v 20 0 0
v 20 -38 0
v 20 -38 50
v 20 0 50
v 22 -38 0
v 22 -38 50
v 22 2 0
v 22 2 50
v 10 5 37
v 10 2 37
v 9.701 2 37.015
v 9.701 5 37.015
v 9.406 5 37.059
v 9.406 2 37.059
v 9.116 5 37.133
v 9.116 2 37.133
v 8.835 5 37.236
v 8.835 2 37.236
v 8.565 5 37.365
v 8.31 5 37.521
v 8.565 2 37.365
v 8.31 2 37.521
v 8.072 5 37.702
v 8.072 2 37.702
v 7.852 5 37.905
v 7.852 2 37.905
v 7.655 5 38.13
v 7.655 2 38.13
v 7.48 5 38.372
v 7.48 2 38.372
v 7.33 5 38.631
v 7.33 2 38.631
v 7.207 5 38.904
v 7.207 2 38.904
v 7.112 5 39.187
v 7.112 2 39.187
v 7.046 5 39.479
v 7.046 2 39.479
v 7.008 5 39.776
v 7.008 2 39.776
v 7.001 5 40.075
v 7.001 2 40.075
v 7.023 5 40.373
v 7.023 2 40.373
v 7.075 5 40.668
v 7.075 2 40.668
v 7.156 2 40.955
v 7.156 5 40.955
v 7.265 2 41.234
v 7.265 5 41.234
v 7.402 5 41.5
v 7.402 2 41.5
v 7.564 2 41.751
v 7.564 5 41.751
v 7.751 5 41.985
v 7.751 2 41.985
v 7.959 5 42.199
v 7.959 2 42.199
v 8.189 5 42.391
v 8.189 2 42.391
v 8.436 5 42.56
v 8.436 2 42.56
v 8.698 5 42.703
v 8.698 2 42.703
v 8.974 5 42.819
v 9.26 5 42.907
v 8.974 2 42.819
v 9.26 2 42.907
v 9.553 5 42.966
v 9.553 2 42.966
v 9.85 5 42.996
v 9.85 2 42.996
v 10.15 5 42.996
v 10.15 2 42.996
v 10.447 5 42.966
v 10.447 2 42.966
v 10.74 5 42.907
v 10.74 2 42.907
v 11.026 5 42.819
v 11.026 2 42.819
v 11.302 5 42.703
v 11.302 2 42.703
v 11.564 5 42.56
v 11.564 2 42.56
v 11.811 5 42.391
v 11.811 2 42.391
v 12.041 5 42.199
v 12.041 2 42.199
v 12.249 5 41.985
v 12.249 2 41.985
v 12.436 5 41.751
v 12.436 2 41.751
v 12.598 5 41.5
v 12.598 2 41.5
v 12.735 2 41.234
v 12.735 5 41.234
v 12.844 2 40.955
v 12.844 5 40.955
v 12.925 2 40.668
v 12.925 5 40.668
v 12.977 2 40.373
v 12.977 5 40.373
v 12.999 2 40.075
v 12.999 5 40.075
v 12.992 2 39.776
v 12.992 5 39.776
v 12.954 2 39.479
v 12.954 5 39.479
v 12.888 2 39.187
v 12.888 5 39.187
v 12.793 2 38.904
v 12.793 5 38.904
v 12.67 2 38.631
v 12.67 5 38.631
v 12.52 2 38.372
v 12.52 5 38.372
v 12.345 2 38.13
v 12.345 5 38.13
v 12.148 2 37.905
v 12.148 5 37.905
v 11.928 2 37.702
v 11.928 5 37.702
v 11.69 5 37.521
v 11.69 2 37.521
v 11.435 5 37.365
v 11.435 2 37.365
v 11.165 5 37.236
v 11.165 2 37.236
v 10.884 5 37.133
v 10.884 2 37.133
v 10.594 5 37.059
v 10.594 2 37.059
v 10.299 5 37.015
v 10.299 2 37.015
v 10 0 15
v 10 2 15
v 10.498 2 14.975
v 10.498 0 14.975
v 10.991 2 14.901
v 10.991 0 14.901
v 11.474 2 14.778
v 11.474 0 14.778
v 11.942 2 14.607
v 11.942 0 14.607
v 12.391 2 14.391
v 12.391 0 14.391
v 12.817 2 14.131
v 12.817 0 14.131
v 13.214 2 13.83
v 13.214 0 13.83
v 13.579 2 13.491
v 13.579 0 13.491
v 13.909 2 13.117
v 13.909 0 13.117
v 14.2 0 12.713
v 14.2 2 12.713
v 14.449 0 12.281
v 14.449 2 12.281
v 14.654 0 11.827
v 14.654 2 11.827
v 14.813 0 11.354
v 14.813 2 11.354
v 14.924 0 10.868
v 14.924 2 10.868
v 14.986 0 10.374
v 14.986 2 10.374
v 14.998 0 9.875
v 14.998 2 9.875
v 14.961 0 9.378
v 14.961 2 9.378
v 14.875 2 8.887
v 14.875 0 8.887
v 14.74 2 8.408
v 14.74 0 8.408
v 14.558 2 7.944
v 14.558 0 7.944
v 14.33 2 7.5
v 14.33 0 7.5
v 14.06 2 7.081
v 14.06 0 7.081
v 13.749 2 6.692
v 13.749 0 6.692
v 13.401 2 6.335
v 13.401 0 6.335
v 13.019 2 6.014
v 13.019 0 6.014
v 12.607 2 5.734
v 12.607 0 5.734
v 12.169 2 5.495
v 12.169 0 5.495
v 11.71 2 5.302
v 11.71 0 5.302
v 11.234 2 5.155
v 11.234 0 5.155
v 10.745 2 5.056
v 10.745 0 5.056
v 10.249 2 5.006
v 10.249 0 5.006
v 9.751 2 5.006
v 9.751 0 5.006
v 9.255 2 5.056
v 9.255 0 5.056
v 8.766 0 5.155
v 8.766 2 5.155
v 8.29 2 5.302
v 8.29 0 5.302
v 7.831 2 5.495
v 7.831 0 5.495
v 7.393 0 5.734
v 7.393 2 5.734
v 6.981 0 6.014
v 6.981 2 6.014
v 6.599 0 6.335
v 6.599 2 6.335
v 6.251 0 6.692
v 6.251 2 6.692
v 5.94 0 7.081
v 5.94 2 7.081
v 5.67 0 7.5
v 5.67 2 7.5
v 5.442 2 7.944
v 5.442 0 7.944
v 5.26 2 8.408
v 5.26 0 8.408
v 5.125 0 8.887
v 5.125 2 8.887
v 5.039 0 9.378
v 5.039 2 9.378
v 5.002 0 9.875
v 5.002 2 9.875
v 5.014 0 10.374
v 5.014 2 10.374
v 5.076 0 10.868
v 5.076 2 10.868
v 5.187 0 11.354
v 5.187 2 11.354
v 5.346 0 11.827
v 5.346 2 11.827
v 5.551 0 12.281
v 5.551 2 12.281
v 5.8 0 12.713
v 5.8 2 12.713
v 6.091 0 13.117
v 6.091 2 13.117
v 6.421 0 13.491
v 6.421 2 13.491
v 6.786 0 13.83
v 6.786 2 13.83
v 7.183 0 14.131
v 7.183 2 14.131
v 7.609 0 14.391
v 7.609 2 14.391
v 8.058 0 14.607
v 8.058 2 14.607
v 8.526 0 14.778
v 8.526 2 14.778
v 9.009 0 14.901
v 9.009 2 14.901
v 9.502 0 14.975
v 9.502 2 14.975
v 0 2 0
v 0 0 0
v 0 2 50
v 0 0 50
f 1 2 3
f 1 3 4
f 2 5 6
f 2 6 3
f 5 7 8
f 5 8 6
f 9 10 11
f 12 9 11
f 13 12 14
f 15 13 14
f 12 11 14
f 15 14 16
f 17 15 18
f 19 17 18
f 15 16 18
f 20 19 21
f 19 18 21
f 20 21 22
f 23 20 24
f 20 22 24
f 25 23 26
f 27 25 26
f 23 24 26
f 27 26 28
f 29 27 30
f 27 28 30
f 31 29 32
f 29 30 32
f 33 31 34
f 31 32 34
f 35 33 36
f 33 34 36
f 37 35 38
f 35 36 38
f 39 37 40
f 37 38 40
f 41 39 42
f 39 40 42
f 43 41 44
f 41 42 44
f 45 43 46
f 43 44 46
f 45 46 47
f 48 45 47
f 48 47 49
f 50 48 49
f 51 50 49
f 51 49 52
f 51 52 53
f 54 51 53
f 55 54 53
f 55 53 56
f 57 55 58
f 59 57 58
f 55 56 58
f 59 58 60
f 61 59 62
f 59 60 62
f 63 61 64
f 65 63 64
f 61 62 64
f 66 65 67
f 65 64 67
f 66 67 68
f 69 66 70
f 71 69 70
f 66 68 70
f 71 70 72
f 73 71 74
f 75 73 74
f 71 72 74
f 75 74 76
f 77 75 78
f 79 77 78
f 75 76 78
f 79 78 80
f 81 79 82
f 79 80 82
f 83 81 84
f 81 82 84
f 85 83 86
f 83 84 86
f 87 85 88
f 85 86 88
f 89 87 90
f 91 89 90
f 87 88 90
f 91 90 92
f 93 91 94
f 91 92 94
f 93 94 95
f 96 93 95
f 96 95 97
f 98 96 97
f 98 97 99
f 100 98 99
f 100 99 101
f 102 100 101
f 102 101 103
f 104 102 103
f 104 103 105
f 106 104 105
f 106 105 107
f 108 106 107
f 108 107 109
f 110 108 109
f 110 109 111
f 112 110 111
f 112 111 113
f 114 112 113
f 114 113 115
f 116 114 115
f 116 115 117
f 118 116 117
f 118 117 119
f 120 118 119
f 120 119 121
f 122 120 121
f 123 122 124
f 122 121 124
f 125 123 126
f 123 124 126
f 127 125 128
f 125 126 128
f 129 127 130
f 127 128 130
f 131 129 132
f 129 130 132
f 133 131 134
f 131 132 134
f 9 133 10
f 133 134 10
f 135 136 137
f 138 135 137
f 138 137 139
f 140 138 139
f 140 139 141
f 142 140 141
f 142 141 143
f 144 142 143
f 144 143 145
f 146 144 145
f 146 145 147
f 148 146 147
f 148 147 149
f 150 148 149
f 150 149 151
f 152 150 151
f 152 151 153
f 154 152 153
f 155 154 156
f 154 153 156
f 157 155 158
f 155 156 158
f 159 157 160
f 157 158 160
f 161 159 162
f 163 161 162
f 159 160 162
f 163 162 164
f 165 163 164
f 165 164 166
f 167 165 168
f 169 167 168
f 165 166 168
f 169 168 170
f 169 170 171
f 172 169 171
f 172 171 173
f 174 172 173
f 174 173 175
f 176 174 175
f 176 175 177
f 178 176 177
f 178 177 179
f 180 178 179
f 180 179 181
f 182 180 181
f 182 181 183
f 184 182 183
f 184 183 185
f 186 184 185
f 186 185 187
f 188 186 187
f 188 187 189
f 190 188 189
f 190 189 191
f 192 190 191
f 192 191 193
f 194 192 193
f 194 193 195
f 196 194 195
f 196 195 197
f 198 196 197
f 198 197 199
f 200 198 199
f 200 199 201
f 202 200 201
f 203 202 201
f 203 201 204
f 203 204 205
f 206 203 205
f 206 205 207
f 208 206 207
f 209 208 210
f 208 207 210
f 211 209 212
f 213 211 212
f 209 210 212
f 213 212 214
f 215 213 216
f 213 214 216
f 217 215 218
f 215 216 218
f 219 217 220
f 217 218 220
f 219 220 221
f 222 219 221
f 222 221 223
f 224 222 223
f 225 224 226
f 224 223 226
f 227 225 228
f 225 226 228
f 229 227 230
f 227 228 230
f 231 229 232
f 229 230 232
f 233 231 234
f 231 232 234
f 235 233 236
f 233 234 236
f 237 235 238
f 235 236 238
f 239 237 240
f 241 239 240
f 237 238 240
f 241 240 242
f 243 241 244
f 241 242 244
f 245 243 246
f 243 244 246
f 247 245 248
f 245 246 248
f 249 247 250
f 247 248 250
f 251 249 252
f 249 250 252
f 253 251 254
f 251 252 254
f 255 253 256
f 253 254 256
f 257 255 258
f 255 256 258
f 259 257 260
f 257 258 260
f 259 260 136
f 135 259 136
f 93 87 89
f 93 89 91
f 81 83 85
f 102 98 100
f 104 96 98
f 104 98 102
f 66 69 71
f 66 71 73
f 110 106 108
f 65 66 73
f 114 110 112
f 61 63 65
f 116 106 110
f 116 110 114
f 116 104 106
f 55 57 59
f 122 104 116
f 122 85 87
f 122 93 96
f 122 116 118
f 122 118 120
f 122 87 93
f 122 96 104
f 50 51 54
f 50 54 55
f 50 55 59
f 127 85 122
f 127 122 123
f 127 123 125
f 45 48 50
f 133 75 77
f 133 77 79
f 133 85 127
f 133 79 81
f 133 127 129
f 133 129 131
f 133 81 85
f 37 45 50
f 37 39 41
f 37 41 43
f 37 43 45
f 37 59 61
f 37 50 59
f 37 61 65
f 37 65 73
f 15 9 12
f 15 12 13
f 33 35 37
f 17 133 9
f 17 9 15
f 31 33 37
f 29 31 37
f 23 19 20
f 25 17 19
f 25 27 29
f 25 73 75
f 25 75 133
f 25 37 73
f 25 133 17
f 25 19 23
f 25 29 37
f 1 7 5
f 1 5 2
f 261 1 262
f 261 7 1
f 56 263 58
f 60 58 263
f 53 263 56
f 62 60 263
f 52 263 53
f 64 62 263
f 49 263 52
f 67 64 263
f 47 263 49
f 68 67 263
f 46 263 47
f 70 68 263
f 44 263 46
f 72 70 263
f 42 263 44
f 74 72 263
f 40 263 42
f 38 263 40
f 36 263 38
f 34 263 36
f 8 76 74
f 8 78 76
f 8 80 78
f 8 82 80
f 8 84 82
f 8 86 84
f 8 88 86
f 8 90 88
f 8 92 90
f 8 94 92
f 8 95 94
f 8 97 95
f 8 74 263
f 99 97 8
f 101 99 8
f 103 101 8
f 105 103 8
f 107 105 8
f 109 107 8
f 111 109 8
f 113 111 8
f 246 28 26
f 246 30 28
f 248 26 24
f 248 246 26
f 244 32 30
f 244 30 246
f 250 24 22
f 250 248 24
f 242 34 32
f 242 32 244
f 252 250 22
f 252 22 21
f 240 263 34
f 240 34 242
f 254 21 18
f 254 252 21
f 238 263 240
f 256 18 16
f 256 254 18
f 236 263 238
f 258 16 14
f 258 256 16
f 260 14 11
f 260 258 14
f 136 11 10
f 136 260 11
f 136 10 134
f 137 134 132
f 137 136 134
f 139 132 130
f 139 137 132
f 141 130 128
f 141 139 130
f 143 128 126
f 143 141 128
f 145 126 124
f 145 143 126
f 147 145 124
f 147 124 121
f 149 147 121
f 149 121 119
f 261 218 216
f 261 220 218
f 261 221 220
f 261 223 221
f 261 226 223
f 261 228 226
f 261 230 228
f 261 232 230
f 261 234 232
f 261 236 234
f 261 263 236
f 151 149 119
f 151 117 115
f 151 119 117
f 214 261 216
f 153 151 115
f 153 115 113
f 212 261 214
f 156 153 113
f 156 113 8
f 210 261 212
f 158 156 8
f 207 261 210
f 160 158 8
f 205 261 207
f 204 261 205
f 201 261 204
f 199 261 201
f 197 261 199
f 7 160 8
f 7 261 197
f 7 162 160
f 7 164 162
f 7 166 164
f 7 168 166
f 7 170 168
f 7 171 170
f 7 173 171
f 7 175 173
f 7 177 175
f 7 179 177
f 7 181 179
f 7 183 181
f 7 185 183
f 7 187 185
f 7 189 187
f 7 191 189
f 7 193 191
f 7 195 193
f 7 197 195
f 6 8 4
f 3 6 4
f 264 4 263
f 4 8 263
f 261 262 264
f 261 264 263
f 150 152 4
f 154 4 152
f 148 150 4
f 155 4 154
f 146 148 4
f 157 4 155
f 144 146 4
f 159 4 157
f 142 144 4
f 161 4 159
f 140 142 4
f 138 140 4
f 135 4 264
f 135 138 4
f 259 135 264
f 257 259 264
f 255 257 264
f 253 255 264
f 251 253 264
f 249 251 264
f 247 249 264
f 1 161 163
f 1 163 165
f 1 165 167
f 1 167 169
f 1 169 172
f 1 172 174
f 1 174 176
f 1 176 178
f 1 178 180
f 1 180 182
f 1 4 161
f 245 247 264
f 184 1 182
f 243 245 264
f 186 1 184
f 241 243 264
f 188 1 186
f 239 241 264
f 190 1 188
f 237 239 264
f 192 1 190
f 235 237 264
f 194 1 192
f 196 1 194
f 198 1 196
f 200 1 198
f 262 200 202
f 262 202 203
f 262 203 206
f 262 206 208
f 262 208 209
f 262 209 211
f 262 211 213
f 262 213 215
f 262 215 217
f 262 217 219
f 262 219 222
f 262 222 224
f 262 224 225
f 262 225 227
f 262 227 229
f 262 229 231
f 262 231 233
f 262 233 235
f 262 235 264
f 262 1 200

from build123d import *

# Parameters (mm, degrees)
SALIENTE_EXTRUIR1_DEPTH = 50
CORTAR_EXTRUIR1_REACH   = 69.705
CROQUIS2_R              = 5
CROQUIS3_R              = 3
SALIENTE_EXTRUIR2_DEPTH = 3


with BuildPart() as part:
    # Croquis1 → Saliente-Extruir1 (new body)
    with BuildSketch(Plane.XY):
        Polygon((0, 0), (0, 2), (22, 2), (22, -38), (20, -38), (20, 0), align=None)
    extrude(amount=SALIENTE_EXTRUIR1_DEPTH)

    # Croquis2 → Cortar-Extruir1 (cut, up to next)
    with BuildSketch(Plane(origin=(0, 2, 0), x_dir=(1, 0, 0), z_dir=(0, 1, 0)), mode=Mode.PRIVATE) as cortar_extruir1_sk1:
        with Locations(Location((10, -10, 0), (0, 0, 270))):
            Circle(CROQUIS2_R)
    cortar_extruir1_tool1 = extrude(cortar_extruir1_sk1.sketch, amount=-CORTAR_EXTRUIR1_REACH, mode=Mode.PRIVATE) & part.part
    add(cortar_extruir1_tool1.solids().sort_by_distance((10, 2, 10))[0], mode=Mode.SUBTRACT)

    # Croquis3 → Saliente-Extruir2 (add)
    with BuildSketch(Plane(origin=(0, 2, 0), x_dir=(1, 0, 0), z_dir=(0, 1, 0))):
        with Locations(Location((10, -40, 0), (0, 0, 90))):
            Circle(CROQUIS3_R)
    extrude(amount=SALIENTE_EXTRUIR2_DEPTH)


solid = part.part
